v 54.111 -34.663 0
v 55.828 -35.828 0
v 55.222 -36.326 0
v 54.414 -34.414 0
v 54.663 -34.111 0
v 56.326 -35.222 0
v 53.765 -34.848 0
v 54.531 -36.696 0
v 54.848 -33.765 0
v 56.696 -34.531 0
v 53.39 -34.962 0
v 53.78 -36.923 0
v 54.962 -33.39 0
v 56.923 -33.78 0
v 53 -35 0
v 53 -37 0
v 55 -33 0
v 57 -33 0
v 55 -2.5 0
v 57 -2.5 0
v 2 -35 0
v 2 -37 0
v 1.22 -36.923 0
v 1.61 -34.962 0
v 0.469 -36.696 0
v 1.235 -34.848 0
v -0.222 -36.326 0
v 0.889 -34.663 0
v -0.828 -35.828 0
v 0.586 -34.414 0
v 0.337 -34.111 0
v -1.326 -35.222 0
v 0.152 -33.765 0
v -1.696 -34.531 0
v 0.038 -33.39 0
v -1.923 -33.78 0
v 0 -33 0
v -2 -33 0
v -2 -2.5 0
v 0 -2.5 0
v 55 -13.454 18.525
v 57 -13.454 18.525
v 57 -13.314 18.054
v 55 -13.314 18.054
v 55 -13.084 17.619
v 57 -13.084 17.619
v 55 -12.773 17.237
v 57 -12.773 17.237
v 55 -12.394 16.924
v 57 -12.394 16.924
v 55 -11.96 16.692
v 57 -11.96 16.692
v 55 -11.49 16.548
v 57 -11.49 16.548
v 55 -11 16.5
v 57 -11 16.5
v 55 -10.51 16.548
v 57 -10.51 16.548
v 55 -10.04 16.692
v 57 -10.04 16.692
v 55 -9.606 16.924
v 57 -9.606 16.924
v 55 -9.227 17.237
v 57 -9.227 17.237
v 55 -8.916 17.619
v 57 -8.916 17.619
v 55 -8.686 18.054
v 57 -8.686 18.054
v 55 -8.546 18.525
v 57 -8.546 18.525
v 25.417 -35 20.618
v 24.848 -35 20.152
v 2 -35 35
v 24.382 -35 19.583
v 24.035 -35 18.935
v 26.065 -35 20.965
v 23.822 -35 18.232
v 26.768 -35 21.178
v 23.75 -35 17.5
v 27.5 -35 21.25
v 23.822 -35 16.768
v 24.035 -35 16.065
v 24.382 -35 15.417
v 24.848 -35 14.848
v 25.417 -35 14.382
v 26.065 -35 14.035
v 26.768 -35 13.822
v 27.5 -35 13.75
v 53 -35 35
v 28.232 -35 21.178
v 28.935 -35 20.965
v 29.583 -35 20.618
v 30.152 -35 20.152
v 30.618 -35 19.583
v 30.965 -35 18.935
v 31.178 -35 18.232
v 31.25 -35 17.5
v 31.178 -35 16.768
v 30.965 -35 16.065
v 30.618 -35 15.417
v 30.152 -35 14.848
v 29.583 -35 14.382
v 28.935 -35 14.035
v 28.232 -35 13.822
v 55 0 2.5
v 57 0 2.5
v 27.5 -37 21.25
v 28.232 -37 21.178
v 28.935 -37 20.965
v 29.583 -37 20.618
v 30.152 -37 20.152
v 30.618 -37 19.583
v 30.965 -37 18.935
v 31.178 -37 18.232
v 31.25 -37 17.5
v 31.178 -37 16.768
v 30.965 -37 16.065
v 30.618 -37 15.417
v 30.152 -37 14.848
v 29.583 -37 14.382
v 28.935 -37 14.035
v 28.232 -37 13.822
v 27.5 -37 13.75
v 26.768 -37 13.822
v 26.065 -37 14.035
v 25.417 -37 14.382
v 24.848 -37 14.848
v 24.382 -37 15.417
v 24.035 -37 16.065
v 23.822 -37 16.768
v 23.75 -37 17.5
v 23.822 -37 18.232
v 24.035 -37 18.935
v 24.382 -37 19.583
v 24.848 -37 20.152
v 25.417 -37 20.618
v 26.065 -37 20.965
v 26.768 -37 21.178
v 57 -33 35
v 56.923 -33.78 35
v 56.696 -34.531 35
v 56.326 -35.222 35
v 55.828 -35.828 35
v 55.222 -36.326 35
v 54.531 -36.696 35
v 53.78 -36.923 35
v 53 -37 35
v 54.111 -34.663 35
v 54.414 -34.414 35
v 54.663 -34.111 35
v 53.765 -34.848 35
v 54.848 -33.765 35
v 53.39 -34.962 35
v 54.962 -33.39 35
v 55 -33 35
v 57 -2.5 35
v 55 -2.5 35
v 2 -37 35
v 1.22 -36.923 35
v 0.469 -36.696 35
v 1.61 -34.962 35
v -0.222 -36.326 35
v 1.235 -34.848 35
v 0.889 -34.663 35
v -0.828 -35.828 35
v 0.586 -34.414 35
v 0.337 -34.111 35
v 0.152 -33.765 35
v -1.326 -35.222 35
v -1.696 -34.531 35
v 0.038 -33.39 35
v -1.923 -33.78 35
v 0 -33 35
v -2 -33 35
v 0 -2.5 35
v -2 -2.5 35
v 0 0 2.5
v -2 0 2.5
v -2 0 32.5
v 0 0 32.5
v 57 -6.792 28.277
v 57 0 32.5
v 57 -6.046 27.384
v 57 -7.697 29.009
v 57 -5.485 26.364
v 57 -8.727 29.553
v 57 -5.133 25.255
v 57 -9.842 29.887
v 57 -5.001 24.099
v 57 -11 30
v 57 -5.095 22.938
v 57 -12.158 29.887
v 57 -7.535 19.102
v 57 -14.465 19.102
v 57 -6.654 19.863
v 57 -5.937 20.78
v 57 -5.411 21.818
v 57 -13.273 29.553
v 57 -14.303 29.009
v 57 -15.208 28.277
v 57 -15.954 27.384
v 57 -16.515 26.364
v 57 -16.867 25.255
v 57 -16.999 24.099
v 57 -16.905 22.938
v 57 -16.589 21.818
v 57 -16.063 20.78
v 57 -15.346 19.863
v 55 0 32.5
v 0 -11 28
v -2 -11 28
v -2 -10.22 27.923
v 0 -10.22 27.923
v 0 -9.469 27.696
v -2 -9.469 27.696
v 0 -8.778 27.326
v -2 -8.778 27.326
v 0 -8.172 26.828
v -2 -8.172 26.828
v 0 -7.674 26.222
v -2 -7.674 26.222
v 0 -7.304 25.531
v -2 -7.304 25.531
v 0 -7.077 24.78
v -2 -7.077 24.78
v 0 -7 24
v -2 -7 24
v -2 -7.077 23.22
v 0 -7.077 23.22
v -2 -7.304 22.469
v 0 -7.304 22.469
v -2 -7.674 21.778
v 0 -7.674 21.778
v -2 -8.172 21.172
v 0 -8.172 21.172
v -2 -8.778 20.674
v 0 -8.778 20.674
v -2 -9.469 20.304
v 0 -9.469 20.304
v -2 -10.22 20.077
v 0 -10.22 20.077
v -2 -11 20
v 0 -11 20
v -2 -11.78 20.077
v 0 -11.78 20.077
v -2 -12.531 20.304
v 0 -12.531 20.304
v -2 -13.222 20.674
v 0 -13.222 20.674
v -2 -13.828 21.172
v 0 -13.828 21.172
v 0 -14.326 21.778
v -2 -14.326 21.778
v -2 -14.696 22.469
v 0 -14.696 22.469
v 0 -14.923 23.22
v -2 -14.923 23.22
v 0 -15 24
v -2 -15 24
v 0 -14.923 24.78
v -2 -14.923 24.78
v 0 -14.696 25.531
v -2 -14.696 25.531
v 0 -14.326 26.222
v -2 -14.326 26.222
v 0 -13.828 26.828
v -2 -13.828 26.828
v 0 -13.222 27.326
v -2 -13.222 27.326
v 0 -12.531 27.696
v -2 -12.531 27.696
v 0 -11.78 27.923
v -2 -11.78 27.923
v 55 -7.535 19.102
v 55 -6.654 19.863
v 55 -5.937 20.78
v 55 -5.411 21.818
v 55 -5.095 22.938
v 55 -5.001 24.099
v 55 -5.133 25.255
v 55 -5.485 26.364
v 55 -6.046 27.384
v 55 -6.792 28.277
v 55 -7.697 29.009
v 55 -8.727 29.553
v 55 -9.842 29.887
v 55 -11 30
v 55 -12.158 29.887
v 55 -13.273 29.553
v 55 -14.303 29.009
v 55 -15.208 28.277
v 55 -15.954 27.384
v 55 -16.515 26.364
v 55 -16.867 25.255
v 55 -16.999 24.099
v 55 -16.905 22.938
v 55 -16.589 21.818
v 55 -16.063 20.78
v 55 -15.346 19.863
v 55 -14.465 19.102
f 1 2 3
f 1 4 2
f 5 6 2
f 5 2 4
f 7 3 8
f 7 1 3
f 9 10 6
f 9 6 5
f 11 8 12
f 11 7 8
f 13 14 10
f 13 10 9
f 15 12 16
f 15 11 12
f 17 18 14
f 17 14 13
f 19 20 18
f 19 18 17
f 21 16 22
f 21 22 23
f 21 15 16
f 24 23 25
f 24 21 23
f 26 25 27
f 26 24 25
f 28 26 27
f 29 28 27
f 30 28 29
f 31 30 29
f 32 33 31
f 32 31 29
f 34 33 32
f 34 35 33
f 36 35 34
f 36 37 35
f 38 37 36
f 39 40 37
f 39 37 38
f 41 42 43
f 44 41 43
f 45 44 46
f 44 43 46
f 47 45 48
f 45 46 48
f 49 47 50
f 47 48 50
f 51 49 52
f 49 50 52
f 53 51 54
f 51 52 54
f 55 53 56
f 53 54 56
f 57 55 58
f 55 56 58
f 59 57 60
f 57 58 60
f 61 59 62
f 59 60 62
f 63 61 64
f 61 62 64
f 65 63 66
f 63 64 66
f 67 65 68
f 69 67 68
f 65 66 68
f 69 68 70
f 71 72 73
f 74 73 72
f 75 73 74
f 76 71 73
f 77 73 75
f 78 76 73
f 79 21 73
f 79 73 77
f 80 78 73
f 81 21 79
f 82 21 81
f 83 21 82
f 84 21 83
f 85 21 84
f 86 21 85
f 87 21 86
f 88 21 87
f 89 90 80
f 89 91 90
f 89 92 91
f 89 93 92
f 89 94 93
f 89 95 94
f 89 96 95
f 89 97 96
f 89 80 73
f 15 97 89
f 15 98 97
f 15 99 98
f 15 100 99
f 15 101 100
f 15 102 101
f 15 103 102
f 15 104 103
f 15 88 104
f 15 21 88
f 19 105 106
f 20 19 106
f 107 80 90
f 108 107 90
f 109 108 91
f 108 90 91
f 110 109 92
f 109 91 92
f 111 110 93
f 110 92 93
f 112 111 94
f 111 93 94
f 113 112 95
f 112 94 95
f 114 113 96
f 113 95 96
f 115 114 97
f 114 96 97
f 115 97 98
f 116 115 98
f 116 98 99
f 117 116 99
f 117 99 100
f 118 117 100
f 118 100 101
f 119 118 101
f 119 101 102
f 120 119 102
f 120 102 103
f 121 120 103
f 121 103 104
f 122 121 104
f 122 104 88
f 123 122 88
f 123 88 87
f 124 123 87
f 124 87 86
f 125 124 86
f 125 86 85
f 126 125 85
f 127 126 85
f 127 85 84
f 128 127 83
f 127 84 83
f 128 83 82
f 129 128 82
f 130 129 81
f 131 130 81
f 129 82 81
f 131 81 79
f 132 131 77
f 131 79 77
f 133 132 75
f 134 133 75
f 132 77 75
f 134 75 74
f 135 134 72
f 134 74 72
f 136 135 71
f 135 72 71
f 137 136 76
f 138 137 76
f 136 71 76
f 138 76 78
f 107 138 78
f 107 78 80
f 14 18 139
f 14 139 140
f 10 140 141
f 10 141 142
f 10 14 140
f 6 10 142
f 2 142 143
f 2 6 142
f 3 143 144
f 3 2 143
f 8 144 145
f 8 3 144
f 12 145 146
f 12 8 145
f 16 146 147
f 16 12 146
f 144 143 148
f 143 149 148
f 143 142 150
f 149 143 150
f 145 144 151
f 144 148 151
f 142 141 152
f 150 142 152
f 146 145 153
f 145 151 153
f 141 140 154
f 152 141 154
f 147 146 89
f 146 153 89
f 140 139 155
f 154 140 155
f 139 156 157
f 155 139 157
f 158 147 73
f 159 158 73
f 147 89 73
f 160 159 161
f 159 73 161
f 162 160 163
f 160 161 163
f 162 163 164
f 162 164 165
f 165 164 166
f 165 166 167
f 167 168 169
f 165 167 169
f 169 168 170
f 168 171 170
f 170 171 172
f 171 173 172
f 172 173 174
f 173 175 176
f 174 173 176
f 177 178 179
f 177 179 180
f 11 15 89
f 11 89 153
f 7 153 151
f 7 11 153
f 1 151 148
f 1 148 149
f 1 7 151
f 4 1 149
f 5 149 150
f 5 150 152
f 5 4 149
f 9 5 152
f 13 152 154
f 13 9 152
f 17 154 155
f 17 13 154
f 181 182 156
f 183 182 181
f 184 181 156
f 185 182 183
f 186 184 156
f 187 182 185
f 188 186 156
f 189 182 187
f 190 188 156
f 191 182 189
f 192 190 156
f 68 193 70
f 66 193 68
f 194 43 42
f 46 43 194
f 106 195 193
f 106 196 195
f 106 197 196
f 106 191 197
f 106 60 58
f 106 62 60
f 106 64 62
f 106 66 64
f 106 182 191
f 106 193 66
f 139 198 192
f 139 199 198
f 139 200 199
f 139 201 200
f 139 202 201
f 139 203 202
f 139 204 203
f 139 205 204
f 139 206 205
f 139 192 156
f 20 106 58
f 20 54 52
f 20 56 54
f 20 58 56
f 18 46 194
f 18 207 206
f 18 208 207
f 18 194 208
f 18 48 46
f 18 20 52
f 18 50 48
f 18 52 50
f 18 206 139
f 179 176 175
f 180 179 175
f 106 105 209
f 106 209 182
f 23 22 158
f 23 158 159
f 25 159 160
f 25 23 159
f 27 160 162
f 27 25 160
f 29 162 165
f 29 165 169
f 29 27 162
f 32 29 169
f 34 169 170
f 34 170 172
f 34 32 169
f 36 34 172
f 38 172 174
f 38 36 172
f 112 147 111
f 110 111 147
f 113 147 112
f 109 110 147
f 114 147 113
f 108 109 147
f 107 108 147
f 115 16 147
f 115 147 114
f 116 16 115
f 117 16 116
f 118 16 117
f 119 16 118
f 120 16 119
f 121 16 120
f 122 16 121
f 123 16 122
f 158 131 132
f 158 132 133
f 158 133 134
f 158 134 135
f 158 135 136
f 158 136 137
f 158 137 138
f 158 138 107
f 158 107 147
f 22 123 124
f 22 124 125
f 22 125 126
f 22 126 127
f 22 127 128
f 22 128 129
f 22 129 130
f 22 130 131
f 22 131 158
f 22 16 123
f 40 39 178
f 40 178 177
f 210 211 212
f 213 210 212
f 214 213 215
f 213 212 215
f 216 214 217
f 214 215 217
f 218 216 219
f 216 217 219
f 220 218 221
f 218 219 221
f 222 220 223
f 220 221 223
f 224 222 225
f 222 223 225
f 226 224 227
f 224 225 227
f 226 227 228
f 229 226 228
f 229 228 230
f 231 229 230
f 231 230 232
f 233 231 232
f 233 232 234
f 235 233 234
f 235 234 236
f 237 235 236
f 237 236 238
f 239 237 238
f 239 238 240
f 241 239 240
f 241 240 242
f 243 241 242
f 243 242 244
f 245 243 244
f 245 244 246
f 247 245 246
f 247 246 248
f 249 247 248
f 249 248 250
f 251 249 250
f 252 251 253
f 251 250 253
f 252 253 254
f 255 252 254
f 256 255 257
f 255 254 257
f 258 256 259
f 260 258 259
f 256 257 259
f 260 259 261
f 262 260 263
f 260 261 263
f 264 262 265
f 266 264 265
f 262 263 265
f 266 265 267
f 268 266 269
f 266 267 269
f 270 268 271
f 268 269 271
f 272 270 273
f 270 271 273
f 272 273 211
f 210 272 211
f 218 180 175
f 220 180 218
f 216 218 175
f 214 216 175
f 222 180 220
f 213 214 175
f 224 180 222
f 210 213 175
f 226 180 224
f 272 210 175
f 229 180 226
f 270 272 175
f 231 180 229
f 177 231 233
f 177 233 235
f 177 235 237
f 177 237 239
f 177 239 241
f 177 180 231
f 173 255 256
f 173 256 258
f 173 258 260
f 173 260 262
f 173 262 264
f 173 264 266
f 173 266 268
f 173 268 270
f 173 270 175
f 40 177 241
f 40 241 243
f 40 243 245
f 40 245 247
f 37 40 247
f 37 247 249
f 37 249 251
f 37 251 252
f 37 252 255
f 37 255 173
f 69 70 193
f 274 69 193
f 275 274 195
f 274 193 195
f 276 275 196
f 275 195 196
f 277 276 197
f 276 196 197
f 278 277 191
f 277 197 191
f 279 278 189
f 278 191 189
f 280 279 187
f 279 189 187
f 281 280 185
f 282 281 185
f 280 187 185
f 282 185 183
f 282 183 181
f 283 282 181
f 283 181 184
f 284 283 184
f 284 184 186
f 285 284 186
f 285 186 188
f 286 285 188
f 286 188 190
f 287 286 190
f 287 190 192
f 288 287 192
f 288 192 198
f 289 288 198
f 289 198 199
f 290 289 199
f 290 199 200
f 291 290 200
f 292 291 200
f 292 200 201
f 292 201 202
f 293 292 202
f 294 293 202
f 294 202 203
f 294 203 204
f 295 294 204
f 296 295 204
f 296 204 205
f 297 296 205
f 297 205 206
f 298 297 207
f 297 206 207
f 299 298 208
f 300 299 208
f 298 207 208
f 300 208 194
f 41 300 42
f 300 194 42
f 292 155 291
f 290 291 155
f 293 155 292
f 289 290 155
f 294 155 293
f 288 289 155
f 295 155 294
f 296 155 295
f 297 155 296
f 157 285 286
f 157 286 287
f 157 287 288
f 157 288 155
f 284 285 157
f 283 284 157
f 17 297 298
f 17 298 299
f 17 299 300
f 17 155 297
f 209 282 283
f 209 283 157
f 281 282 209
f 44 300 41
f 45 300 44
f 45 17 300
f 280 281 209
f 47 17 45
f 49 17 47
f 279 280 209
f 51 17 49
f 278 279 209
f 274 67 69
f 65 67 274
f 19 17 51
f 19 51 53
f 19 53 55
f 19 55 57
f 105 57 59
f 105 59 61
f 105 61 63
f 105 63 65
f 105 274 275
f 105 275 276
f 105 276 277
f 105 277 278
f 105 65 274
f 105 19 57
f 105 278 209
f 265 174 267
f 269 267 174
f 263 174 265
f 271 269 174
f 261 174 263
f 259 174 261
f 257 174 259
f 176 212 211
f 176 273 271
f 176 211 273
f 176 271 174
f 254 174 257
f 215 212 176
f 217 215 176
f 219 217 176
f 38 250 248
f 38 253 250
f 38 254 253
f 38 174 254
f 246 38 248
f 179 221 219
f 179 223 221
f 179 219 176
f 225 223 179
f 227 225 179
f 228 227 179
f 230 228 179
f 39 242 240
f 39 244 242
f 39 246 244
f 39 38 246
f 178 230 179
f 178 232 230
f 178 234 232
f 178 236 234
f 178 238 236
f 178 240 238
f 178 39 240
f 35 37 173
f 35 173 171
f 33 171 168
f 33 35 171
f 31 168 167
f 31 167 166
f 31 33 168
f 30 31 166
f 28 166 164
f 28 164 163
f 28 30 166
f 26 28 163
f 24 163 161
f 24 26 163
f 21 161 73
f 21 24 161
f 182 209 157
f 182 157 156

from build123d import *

# Parameters (mm, degrees)
BASE_FLANGE1_DEPTH = 35
CUT_EXTRUDE1_REACH = 79.942
CUT_EXTRUDE2_REACH = 79.942
SKETCH7_R          = 4
CUT_EXTRUDE3_REACH = 77.492
SKETCH8_R          = 3.75
CHAMFER1_SIZE      = 2.5


# Sheet-metal steps are written as plain solids
with BuildPart() as part:
    # Sketch1 → Base-Flange1 (new body)
    with BuildSketch(Plane.XY):
        with BuildLine():
            Line((0, 0), (0, -33))
            ThreePointArc((0, -33), (0.585786438, -34.414213562), (2, -35))
            Line((2, -35), (53, -35))
            ThreePointArc((53, -35), (54.414213562, -34.414213562), (55, -33))
            Line((55, -33), (55, 0))
            Line((55, 0), (57, 0))
            Line((57, 0), (57, -33))
            ThreePointArc((57, -33), (55.828427125, -35.828427125), (53, -37))
            Line((53, -37), (2, -37))
            ThreePointArc((2, -37), (-0.828427125, -35.828427125), (-2, -33))
            Line((-2, -33), (-2, 0))
            Line((-2, 0), (0, 0))
        make_face()
    extrude(amount=BASE_FLANGE1_DEPTH)

    # Sketch6 → Cut-Extrude1 (cut, up to next)
    with BuildSketch(Plane(origin=(57, 0, 0), x_dir=(0, 0, -1), z_dir=(1, 0, 0)), mode=Mode.PRIVATE) as cut_extrude1_sk1:
        with BuildLine():
            ThreePointArc((-18.525, -8.545539774), (-30, -11), (-18.525, -13.454460226))
            ThreePointArc((-18.525, -13.454460226), (-16.5, -11), (-18.525, -8.545539774))
        make_face()
    cut_extrude1_tool1 = extrude(cut_extrude1_sk1.sketch, amount=-CUT_EXTRUDE1_REACH, mode=Mode.PRIVATE) & part.part
    add(cut_extrude1_tool1.solids().sort_by_distance((57, -11, 23.686214))[0], mode=Mode.SUBTRACT)

    # Sketch7 → Cut-Extrude2 (cut, up to next)
    with BuildSketch(Plane.ZY.offset(2), mode=Mode.PRIVATE) as cut_extrude2_sk1:
        with Locations((24, -11)):
            Circle(SKETCH7_R)
    cut_extrude2_tool1 = extrude(cut_extrude2_sk1.sketch, amount=-CUT_EXTRUDE2_REACH, mode=Mode.PRIVATE) & part.part
    add(cut_extrude2_tool1.solids().sort_by_distance((-2, -11, 24))[0], mode=Mode.SUBTRACT)

    # Sketch8 → Cut-Extrude3 (cut, up to next)
    with BuildSketch(Plane(origin=(0, -35, 0), x_dir=(1, 0, 0), z_dir=(0, 1, 0)), mode=Mode.PRIVATE) as cut_extrude3_sk1:
        with Locations(Location((27.5, -17.5, 0), (0, 0, 270))):
            Circle(SKETCH8_R)
    cut_extrude3_tool1 = extrude(cut_extrude3_sk1.sketch, amount=-CUT_EXTRUDE3_REACH, mode=Mode.PRIVATE) & part.part
    add(cut_extrude3_tool1.solids().sort_by_distance((27.5, -35, 17.5))[0], mode=Mode.SUBTRACT)

    # Chamfer1
    chamfer1_edges = [part.edges().sort_by_distance(p)[0] for p in [
        (-1, 0, 0),
        (56, 0, 0),
        (-1, 0, 35),
        (56, 0, 35),
    ]]
    chamfer(chamfer1_edges, length=CHAMFER1_SIZE)


solid = part.part
